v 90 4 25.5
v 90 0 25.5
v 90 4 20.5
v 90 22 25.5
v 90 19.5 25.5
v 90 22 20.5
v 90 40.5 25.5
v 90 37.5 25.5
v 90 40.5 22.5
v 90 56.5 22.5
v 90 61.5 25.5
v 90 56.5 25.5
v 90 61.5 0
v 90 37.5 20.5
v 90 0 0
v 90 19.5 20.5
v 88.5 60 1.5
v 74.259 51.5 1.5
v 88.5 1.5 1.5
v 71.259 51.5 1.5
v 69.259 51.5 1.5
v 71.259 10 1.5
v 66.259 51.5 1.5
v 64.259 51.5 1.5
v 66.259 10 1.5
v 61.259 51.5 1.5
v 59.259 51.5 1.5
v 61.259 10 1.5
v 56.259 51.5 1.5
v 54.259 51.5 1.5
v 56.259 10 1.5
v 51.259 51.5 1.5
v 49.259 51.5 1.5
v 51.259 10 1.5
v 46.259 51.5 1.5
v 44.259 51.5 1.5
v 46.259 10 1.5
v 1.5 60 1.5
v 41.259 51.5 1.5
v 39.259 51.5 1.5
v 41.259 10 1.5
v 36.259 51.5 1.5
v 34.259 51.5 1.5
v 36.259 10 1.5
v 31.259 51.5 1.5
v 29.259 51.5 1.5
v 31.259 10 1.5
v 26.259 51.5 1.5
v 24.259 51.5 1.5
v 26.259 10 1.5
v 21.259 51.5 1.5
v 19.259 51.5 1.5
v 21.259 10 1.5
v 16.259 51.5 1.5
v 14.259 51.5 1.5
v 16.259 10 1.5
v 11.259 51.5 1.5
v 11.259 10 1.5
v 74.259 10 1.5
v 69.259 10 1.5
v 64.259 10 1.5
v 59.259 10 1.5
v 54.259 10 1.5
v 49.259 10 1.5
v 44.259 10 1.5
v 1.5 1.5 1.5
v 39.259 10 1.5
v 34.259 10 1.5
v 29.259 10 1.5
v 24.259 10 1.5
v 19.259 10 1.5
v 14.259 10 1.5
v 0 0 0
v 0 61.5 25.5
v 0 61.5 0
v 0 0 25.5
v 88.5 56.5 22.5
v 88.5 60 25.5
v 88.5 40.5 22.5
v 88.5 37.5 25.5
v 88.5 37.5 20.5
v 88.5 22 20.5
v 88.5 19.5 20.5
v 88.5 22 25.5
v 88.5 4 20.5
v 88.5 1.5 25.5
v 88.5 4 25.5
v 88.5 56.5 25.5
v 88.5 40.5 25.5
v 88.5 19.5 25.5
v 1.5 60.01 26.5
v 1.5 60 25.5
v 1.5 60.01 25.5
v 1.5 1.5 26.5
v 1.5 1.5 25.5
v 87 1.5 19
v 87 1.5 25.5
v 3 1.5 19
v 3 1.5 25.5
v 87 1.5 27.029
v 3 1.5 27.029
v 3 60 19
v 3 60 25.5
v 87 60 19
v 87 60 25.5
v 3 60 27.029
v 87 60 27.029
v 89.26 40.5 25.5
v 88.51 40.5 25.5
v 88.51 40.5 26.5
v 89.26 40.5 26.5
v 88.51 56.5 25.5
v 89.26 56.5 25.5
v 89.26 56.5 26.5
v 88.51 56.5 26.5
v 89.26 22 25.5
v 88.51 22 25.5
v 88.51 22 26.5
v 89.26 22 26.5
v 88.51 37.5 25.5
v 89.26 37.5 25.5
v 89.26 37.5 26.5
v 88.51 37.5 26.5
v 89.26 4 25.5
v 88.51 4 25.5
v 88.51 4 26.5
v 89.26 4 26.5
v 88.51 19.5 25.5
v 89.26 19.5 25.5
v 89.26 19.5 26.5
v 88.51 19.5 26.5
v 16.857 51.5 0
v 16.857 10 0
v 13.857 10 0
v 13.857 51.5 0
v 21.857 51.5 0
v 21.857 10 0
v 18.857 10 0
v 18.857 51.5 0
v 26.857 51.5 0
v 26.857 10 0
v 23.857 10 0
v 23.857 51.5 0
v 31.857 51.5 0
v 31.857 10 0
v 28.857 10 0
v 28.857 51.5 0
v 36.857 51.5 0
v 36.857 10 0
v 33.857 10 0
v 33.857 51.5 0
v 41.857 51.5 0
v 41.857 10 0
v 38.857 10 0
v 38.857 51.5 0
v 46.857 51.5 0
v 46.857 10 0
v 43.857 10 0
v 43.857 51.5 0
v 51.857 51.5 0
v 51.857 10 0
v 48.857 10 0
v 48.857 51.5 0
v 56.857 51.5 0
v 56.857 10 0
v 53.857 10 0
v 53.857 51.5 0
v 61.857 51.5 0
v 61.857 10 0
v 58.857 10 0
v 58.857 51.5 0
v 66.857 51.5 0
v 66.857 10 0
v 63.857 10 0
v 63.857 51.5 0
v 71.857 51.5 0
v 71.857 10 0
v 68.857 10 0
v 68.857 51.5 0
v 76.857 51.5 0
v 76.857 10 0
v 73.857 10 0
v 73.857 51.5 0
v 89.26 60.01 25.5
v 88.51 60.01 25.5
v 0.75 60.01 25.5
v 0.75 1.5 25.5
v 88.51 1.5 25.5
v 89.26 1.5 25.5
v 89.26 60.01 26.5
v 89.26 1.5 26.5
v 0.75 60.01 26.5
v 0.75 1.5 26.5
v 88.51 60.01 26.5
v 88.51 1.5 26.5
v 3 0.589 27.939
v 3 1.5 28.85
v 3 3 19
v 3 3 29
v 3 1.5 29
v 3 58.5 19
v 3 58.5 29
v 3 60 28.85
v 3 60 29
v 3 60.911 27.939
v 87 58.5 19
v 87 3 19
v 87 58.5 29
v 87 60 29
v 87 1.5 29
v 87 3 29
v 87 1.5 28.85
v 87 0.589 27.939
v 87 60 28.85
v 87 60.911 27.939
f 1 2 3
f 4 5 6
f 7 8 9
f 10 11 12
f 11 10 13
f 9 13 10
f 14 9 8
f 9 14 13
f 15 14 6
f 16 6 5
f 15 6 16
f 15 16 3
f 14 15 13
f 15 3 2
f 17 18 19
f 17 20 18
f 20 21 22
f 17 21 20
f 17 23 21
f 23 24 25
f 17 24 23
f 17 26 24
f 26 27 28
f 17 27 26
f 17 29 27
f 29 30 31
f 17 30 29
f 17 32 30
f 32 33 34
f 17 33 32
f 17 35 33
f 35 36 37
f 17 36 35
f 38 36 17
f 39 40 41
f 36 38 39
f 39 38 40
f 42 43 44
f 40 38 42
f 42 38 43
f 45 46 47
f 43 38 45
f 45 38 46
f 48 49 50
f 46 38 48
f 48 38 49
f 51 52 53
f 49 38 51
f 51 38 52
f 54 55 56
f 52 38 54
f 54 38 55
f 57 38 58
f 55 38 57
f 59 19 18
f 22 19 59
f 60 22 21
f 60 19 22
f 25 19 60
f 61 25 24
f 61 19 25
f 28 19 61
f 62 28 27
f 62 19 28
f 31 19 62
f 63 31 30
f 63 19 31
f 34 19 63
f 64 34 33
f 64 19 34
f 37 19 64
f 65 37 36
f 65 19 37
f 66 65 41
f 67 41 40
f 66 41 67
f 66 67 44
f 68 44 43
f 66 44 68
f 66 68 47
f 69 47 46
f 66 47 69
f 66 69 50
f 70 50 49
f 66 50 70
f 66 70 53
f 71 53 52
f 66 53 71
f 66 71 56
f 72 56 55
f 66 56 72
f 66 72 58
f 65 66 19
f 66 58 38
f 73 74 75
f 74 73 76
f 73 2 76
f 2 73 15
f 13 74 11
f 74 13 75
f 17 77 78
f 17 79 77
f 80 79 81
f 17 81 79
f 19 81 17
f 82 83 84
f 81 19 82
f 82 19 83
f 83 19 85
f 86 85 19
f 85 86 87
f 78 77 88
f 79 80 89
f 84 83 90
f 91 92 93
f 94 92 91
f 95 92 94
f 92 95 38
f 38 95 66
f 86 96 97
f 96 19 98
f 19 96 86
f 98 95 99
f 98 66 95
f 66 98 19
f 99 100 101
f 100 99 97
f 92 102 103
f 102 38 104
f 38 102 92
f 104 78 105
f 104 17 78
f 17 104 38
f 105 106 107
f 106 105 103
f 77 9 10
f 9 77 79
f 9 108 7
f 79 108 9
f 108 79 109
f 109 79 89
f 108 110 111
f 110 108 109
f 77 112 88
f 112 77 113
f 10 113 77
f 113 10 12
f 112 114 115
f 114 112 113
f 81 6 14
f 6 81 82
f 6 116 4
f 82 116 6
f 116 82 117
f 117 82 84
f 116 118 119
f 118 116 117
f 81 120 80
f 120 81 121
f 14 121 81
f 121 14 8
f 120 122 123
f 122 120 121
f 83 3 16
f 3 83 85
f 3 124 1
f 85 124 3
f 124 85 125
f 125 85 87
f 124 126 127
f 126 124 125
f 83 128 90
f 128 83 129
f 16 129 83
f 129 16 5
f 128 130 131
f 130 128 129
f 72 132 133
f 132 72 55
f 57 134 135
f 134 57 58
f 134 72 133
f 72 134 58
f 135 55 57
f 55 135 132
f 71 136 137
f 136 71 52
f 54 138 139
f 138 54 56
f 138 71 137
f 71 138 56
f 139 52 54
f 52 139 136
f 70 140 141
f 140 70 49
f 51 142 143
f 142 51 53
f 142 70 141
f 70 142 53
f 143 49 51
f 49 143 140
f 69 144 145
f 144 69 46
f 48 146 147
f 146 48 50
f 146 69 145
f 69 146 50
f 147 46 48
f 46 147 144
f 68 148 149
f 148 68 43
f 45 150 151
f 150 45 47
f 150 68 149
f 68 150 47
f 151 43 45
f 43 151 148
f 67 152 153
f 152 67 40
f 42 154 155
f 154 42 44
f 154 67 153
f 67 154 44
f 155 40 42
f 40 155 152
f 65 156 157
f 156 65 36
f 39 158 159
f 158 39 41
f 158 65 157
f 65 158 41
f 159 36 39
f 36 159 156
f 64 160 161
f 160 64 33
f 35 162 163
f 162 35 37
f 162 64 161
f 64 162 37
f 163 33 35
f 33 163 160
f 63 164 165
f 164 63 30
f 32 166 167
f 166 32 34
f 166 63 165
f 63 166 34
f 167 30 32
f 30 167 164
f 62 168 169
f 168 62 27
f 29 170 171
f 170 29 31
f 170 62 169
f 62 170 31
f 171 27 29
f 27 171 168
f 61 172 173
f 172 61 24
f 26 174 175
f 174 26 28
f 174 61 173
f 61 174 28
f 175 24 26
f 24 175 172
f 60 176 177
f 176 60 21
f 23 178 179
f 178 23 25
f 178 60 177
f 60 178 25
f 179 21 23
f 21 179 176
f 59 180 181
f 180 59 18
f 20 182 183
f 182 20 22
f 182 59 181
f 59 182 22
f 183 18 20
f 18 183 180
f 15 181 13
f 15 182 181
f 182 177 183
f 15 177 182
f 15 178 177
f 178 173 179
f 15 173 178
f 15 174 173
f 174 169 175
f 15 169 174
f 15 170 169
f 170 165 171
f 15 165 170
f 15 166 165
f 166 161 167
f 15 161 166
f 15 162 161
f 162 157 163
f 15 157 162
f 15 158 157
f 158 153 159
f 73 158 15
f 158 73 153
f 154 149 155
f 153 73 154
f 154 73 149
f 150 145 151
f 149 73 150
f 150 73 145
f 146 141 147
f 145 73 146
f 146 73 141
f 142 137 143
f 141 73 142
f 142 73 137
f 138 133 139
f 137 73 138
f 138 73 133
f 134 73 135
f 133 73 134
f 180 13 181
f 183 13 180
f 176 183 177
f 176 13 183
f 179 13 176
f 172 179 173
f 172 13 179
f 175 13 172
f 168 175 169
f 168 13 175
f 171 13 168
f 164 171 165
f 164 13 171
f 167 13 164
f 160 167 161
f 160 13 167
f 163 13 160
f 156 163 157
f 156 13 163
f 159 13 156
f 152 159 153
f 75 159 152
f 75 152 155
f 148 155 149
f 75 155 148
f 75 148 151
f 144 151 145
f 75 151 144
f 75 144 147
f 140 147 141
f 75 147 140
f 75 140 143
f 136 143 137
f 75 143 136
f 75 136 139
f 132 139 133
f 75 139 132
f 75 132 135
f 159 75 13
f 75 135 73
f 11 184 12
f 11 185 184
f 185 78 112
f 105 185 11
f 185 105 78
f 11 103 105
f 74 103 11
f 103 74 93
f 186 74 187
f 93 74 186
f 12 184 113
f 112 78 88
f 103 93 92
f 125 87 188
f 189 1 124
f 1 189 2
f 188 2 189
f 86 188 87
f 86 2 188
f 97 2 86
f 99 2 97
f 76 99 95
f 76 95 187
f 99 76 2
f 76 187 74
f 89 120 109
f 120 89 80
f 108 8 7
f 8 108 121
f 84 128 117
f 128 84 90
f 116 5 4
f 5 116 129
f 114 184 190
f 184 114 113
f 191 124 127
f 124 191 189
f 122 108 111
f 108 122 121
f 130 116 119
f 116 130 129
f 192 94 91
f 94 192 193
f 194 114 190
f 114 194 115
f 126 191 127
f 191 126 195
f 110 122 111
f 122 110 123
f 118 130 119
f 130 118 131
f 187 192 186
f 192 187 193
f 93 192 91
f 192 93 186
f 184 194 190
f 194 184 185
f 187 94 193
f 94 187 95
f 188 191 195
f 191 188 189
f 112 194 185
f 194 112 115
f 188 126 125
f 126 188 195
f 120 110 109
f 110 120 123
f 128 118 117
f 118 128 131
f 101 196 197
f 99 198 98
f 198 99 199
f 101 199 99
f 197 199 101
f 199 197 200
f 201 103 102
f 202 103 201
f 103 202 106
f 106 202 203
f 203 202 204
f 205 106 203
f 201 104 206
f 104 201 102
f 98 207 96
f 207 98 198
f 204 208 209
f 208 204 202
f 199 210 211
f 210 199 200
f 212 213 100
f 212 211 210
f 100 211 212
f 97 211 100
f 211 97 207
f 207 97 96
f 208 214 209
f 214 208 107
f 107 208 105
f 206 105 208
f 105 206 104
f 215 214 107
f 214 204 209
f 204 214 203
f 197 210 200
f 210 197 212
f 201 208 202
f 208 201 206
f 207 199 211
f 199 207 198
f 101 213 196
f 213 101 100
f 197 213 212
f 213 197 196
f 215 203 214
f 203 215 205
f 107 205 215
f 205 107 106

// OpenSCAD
// file: RaspberryPi2B3.scad
$fn=100;

module RaspberryPi3() {
    // Circuit board with mounting holes
    difference() {
        cube([85,56.5,1.5]);
        translate([3.4,3.4,-1])cylinder(d=3,h=5);
        translate([3.4,53.1,-1])cylinder(d=3,h=5);
        translate([61.5,3.4,-1])cylinder(d=3,h=5);
        translate([61.5,53.1,-1])cylinder(d=3,h=5);
    }
    // LAN connector
    translate([66,2.5,1.5])cube([23.5,16,14]);
    // Left USB port
    translate([70,21.5,1.5])cube([19,15.5,16]);
    // Right USB port
    translate([70,39.5,1.5])cube([19,15.5,16]);
    // pin header
    translate([7,49.5,1.5])cube([51,5.5,8.5]);
    // Display-Port
    translate([2,16,1.5])cube([4,22.5,5.5]);
    // Micro USB port
    translate([6.5,-3,1.5])cube([8,6,3.5]);
    minkowski() {
        translate([6.5,-3,1.5])cube([8,1.25,3.5]);
        rotate([90, 0, 0]) cylinder(0.1, d=1.25);
    }
    // HDMI
    translate([24.25,-3,1.5])cube([15.5,12,6.5]);
    // Camera-Port
    translate([43.5,0,1.5])cube([4,22.5,5.5]);
    // Audio Port
    translate([49.75,-3,1.5])cube([7.5,15,6.5]);
    // SD Slot
    translate([-3,21.5,-2])cube([16.5,12.5,2]);
}

RaspberryPi3();
// main file
use <RaspberryPi2B3.scad>;

fudge = 0.01;

pi_width = 56.5;
pi_length = 85;

case_thickness = 1.5;
case_inner_height = 40;
case_inner_offset = 1;

case_latch_height = 10;

mount_hole_spacing_x = 58.1;
mount_hole_spacing_y = 49.7;
mount_hole_edge_offset_x = 3.4;
mount_hole_edge_offset_y = 3.4;

pi_mounting_post_diameter = 8;
pi_mounting_post_height = 3.5;
pi_mounting_post_screw_diameter = 3.5;
pi_mounting_post_screw_head_diameter = 6;
pi_mounting_post_screw_head_recess = 2;

top_case();
//bottom_case();
//pi_case();
//translate([0, 0, (((case_thickness*2)+case_inner_height)/2)-5-(case_latch_height/4)]) case_latch();

module case_latch(offset=0) {
    difference() {
        //We'll difference a cube to draw the two uprights needed
        translate([case_thickness*2, case_thickness, 0]) cube([pi_length+(case_inner_offset*2)-(case_thickness*2),pi_width+(case_inner_offset*2),case_latch_height]);
        translate([case_thickness, case_thickness*2, -fudge/2]) cube([pi_length+(case_inner_offset*2),pi_width+(case_inner_offset*2)-(case_thickness*2),case_latch_height+fudge]);
    }
    //Now add the two angled latches
    translate([case_thickness*2-(offset/2), case_thickness+0.15, 0]) rotate([45, 0, 0]) cube([pi_length+(case_inner_offset*2)-(case_thickness*2)+offset, case_thickness, case_thickness]);
    translate([case_thickness*2-(offset/2), pi_width+(case_inner_offset*2)+case_thickness-0.15, 0]) rotate([45, 0, 0]) cube([pi_length+(case_inner_offset*2)-(case_thickness*2)+offset, case_thickness, case_thickness]);
}

module top_case() {
    difference() {
        //draw the case up side down
        translate([0, pi_width+(case_thickness*2)+(case_inner_offset*2), (case_thickness*2)+case_inner_height]) {
            rotate([180, 0, 0]) pi_case();
        }
        //Now cut off the bottom (which is now the top)
        translate([-fudge/2, -fudge/2, (((case_thickness*2)+case_inner_height)/2)+4]) {
            cube([pi_length+(case_thickness*2)+(case_inner_offset*2)+fudge,pi_width+(case_thickness*2)+(case_inner_offset*2)+fudge,(((case_thickness*2)+case_inner_height+fudge)/2)-4]);
        }
    }
    //Make a lip to keep the top and bottom from sliding
    difference() {
        translate([case_thickness/2, case_thickness, (((case_thickness*2)+case_inner_height)/2)+4]) {
            cube([pi_length+case_thickness+(case_inner_offset*2)+fudge,pi_width+(case_inner_offset*2)+fudge, 1]);
        }
        translate([case_thickness, case_thickness, (((case_thickness*2)+case_inner_height)/2)+4-(fudge/2)]) {
            cube([pi_length+(case_inner_offset*2)+fudge,pi_width+(case_inner_offset*2)+fudge, 1+fudge]);
        }
        translate([case_thickness, pi_width+case_thickness+case_inner_offset, case_inner_height]) {
            rotate([180, 0, 0]) RaspberryPi3();
        }
    }
    
    //Now create the latch
    translate([pi_length+(case_inner_offset*2)+(case_thickness*2), 0, (case_latch_height/4)+((((case_thickness*2)+case_inner_height)/2)+5)]) rotate([0, 180, 0]) case_latch();
}

module bottom_case() {
    difference() {
        //draw the case right side up
        pi_case();
        //Now cut off the top
        translate([-fudge/2, -fudge/2, (((case_thickness*2)+case_inner_height)/2)-4]) {
            cube([pi_length+(case_thickness*2)+(case_inner_offset*2)+fudge,pi_width+(case_thickness*2)+(case_inner_offset*2)+fudge,(((case_thickness*2)+case_inner_height)/2)+4+fudge]);
        }
        //Cut a small lip to keep the top and bottom from sliding
        translate([case_thickness/2, case_thickness, (((case_thickness*2)+case_inner_height)/2)-5]) {
            cube([pi_length+case_thickness+(case_inner_offset*2)+fudge,pi_width+(case_inner_offset*2)+fudge,(((case_thickness*2)+case_inner_height)/2)+4+fudge]);
        }
        //now cut the notch for the cover latch
        translate([0, 0, (((case_thickness*2)+case_inner_height)/2)-5-(case_latch_height/4)]) case_latch(0.5);
    }
}

module pi_case() {
    difference() {
        union() {
            difference() {
                //Create the plain outer case
                cube([pi_length+(case_thickness*2)+(case_inner_offset*2),pi_width+(case_thickness*2)+(case_inner_offset*2),case_thickness+case_inner_height]);
                //Now hollow it out
                translate([case_thickness, case_thickness, case_thickness]) cube([pi_length+(case_inner_offset*2),pi_width+(case_inner_offset*2),case_thickness+case_inner_height]);
            }
            //Add the 4 screw standoffs for the pi
            for(x=[0, 1]*mount_hole_spacing_x) {
                for(y=[0, 1]*mount_hole_spacing_y) {
                    translate([mount_hole_edge_offset_x+case_thickness+case_inner_offset+x, mount_hole_edge_offset_y+case_thickness+case_inner_offset+y, 0]) {
                        cylinder($fn=36, pi_mounting_post_height+case_thickness, d=pi_mounting_post_diameter);
                    }
                }
            }
        }
        //Hollow out for the screw shaft and the screw head
        for(x=[0, 1]*mount_hole_spacing_x) {
            for(y=[0, 1]*mount_hole_spacing_y) {
                translate([mount_hole_edge_offset_x+case_thickness+case_inner_offset+x, mount_hole_edge_offset_y+case_thickness+case_inner_offset+y, -(fudge/2)]) {
                    cylinder($fn=36, pi_mounting_post_height+case_thickness+fudge, d=pi_mounting_post_screw_diameter);
                    cylinder($fn=36, pi_mounting_post_screw_head_recess, d=pi_mounting_post_screw_head_diameter);
                }
            }
        }
        //Now, subtract the pi outline to get the port holes
        translate([case_thickness+case_inner_offset, case_thickness+case_inner_offset, case_thickness+pi_mounting_post_height]) RaspberryPi3();
    }
    //Put a top on it with vent holes for air flow
    difference() {
        translate([0, 0, case_thickness+case_inner_height]) {
            cube([pi_length+(case_thickness*2)+(case_inner_offset*2),pi_width+(case_thickness*2)+(case_inner_offset*2),case_thickness]);
        }
        for(i=[1:5:65]) {
            translate([11+i-0.75, 10, case_thickness+case_inner_height-fudge/2]) {
                rotate([0, 60, 0]) cube([1.5, pi_width-15, case_thickness*4]);
            }
        }
    }
}
